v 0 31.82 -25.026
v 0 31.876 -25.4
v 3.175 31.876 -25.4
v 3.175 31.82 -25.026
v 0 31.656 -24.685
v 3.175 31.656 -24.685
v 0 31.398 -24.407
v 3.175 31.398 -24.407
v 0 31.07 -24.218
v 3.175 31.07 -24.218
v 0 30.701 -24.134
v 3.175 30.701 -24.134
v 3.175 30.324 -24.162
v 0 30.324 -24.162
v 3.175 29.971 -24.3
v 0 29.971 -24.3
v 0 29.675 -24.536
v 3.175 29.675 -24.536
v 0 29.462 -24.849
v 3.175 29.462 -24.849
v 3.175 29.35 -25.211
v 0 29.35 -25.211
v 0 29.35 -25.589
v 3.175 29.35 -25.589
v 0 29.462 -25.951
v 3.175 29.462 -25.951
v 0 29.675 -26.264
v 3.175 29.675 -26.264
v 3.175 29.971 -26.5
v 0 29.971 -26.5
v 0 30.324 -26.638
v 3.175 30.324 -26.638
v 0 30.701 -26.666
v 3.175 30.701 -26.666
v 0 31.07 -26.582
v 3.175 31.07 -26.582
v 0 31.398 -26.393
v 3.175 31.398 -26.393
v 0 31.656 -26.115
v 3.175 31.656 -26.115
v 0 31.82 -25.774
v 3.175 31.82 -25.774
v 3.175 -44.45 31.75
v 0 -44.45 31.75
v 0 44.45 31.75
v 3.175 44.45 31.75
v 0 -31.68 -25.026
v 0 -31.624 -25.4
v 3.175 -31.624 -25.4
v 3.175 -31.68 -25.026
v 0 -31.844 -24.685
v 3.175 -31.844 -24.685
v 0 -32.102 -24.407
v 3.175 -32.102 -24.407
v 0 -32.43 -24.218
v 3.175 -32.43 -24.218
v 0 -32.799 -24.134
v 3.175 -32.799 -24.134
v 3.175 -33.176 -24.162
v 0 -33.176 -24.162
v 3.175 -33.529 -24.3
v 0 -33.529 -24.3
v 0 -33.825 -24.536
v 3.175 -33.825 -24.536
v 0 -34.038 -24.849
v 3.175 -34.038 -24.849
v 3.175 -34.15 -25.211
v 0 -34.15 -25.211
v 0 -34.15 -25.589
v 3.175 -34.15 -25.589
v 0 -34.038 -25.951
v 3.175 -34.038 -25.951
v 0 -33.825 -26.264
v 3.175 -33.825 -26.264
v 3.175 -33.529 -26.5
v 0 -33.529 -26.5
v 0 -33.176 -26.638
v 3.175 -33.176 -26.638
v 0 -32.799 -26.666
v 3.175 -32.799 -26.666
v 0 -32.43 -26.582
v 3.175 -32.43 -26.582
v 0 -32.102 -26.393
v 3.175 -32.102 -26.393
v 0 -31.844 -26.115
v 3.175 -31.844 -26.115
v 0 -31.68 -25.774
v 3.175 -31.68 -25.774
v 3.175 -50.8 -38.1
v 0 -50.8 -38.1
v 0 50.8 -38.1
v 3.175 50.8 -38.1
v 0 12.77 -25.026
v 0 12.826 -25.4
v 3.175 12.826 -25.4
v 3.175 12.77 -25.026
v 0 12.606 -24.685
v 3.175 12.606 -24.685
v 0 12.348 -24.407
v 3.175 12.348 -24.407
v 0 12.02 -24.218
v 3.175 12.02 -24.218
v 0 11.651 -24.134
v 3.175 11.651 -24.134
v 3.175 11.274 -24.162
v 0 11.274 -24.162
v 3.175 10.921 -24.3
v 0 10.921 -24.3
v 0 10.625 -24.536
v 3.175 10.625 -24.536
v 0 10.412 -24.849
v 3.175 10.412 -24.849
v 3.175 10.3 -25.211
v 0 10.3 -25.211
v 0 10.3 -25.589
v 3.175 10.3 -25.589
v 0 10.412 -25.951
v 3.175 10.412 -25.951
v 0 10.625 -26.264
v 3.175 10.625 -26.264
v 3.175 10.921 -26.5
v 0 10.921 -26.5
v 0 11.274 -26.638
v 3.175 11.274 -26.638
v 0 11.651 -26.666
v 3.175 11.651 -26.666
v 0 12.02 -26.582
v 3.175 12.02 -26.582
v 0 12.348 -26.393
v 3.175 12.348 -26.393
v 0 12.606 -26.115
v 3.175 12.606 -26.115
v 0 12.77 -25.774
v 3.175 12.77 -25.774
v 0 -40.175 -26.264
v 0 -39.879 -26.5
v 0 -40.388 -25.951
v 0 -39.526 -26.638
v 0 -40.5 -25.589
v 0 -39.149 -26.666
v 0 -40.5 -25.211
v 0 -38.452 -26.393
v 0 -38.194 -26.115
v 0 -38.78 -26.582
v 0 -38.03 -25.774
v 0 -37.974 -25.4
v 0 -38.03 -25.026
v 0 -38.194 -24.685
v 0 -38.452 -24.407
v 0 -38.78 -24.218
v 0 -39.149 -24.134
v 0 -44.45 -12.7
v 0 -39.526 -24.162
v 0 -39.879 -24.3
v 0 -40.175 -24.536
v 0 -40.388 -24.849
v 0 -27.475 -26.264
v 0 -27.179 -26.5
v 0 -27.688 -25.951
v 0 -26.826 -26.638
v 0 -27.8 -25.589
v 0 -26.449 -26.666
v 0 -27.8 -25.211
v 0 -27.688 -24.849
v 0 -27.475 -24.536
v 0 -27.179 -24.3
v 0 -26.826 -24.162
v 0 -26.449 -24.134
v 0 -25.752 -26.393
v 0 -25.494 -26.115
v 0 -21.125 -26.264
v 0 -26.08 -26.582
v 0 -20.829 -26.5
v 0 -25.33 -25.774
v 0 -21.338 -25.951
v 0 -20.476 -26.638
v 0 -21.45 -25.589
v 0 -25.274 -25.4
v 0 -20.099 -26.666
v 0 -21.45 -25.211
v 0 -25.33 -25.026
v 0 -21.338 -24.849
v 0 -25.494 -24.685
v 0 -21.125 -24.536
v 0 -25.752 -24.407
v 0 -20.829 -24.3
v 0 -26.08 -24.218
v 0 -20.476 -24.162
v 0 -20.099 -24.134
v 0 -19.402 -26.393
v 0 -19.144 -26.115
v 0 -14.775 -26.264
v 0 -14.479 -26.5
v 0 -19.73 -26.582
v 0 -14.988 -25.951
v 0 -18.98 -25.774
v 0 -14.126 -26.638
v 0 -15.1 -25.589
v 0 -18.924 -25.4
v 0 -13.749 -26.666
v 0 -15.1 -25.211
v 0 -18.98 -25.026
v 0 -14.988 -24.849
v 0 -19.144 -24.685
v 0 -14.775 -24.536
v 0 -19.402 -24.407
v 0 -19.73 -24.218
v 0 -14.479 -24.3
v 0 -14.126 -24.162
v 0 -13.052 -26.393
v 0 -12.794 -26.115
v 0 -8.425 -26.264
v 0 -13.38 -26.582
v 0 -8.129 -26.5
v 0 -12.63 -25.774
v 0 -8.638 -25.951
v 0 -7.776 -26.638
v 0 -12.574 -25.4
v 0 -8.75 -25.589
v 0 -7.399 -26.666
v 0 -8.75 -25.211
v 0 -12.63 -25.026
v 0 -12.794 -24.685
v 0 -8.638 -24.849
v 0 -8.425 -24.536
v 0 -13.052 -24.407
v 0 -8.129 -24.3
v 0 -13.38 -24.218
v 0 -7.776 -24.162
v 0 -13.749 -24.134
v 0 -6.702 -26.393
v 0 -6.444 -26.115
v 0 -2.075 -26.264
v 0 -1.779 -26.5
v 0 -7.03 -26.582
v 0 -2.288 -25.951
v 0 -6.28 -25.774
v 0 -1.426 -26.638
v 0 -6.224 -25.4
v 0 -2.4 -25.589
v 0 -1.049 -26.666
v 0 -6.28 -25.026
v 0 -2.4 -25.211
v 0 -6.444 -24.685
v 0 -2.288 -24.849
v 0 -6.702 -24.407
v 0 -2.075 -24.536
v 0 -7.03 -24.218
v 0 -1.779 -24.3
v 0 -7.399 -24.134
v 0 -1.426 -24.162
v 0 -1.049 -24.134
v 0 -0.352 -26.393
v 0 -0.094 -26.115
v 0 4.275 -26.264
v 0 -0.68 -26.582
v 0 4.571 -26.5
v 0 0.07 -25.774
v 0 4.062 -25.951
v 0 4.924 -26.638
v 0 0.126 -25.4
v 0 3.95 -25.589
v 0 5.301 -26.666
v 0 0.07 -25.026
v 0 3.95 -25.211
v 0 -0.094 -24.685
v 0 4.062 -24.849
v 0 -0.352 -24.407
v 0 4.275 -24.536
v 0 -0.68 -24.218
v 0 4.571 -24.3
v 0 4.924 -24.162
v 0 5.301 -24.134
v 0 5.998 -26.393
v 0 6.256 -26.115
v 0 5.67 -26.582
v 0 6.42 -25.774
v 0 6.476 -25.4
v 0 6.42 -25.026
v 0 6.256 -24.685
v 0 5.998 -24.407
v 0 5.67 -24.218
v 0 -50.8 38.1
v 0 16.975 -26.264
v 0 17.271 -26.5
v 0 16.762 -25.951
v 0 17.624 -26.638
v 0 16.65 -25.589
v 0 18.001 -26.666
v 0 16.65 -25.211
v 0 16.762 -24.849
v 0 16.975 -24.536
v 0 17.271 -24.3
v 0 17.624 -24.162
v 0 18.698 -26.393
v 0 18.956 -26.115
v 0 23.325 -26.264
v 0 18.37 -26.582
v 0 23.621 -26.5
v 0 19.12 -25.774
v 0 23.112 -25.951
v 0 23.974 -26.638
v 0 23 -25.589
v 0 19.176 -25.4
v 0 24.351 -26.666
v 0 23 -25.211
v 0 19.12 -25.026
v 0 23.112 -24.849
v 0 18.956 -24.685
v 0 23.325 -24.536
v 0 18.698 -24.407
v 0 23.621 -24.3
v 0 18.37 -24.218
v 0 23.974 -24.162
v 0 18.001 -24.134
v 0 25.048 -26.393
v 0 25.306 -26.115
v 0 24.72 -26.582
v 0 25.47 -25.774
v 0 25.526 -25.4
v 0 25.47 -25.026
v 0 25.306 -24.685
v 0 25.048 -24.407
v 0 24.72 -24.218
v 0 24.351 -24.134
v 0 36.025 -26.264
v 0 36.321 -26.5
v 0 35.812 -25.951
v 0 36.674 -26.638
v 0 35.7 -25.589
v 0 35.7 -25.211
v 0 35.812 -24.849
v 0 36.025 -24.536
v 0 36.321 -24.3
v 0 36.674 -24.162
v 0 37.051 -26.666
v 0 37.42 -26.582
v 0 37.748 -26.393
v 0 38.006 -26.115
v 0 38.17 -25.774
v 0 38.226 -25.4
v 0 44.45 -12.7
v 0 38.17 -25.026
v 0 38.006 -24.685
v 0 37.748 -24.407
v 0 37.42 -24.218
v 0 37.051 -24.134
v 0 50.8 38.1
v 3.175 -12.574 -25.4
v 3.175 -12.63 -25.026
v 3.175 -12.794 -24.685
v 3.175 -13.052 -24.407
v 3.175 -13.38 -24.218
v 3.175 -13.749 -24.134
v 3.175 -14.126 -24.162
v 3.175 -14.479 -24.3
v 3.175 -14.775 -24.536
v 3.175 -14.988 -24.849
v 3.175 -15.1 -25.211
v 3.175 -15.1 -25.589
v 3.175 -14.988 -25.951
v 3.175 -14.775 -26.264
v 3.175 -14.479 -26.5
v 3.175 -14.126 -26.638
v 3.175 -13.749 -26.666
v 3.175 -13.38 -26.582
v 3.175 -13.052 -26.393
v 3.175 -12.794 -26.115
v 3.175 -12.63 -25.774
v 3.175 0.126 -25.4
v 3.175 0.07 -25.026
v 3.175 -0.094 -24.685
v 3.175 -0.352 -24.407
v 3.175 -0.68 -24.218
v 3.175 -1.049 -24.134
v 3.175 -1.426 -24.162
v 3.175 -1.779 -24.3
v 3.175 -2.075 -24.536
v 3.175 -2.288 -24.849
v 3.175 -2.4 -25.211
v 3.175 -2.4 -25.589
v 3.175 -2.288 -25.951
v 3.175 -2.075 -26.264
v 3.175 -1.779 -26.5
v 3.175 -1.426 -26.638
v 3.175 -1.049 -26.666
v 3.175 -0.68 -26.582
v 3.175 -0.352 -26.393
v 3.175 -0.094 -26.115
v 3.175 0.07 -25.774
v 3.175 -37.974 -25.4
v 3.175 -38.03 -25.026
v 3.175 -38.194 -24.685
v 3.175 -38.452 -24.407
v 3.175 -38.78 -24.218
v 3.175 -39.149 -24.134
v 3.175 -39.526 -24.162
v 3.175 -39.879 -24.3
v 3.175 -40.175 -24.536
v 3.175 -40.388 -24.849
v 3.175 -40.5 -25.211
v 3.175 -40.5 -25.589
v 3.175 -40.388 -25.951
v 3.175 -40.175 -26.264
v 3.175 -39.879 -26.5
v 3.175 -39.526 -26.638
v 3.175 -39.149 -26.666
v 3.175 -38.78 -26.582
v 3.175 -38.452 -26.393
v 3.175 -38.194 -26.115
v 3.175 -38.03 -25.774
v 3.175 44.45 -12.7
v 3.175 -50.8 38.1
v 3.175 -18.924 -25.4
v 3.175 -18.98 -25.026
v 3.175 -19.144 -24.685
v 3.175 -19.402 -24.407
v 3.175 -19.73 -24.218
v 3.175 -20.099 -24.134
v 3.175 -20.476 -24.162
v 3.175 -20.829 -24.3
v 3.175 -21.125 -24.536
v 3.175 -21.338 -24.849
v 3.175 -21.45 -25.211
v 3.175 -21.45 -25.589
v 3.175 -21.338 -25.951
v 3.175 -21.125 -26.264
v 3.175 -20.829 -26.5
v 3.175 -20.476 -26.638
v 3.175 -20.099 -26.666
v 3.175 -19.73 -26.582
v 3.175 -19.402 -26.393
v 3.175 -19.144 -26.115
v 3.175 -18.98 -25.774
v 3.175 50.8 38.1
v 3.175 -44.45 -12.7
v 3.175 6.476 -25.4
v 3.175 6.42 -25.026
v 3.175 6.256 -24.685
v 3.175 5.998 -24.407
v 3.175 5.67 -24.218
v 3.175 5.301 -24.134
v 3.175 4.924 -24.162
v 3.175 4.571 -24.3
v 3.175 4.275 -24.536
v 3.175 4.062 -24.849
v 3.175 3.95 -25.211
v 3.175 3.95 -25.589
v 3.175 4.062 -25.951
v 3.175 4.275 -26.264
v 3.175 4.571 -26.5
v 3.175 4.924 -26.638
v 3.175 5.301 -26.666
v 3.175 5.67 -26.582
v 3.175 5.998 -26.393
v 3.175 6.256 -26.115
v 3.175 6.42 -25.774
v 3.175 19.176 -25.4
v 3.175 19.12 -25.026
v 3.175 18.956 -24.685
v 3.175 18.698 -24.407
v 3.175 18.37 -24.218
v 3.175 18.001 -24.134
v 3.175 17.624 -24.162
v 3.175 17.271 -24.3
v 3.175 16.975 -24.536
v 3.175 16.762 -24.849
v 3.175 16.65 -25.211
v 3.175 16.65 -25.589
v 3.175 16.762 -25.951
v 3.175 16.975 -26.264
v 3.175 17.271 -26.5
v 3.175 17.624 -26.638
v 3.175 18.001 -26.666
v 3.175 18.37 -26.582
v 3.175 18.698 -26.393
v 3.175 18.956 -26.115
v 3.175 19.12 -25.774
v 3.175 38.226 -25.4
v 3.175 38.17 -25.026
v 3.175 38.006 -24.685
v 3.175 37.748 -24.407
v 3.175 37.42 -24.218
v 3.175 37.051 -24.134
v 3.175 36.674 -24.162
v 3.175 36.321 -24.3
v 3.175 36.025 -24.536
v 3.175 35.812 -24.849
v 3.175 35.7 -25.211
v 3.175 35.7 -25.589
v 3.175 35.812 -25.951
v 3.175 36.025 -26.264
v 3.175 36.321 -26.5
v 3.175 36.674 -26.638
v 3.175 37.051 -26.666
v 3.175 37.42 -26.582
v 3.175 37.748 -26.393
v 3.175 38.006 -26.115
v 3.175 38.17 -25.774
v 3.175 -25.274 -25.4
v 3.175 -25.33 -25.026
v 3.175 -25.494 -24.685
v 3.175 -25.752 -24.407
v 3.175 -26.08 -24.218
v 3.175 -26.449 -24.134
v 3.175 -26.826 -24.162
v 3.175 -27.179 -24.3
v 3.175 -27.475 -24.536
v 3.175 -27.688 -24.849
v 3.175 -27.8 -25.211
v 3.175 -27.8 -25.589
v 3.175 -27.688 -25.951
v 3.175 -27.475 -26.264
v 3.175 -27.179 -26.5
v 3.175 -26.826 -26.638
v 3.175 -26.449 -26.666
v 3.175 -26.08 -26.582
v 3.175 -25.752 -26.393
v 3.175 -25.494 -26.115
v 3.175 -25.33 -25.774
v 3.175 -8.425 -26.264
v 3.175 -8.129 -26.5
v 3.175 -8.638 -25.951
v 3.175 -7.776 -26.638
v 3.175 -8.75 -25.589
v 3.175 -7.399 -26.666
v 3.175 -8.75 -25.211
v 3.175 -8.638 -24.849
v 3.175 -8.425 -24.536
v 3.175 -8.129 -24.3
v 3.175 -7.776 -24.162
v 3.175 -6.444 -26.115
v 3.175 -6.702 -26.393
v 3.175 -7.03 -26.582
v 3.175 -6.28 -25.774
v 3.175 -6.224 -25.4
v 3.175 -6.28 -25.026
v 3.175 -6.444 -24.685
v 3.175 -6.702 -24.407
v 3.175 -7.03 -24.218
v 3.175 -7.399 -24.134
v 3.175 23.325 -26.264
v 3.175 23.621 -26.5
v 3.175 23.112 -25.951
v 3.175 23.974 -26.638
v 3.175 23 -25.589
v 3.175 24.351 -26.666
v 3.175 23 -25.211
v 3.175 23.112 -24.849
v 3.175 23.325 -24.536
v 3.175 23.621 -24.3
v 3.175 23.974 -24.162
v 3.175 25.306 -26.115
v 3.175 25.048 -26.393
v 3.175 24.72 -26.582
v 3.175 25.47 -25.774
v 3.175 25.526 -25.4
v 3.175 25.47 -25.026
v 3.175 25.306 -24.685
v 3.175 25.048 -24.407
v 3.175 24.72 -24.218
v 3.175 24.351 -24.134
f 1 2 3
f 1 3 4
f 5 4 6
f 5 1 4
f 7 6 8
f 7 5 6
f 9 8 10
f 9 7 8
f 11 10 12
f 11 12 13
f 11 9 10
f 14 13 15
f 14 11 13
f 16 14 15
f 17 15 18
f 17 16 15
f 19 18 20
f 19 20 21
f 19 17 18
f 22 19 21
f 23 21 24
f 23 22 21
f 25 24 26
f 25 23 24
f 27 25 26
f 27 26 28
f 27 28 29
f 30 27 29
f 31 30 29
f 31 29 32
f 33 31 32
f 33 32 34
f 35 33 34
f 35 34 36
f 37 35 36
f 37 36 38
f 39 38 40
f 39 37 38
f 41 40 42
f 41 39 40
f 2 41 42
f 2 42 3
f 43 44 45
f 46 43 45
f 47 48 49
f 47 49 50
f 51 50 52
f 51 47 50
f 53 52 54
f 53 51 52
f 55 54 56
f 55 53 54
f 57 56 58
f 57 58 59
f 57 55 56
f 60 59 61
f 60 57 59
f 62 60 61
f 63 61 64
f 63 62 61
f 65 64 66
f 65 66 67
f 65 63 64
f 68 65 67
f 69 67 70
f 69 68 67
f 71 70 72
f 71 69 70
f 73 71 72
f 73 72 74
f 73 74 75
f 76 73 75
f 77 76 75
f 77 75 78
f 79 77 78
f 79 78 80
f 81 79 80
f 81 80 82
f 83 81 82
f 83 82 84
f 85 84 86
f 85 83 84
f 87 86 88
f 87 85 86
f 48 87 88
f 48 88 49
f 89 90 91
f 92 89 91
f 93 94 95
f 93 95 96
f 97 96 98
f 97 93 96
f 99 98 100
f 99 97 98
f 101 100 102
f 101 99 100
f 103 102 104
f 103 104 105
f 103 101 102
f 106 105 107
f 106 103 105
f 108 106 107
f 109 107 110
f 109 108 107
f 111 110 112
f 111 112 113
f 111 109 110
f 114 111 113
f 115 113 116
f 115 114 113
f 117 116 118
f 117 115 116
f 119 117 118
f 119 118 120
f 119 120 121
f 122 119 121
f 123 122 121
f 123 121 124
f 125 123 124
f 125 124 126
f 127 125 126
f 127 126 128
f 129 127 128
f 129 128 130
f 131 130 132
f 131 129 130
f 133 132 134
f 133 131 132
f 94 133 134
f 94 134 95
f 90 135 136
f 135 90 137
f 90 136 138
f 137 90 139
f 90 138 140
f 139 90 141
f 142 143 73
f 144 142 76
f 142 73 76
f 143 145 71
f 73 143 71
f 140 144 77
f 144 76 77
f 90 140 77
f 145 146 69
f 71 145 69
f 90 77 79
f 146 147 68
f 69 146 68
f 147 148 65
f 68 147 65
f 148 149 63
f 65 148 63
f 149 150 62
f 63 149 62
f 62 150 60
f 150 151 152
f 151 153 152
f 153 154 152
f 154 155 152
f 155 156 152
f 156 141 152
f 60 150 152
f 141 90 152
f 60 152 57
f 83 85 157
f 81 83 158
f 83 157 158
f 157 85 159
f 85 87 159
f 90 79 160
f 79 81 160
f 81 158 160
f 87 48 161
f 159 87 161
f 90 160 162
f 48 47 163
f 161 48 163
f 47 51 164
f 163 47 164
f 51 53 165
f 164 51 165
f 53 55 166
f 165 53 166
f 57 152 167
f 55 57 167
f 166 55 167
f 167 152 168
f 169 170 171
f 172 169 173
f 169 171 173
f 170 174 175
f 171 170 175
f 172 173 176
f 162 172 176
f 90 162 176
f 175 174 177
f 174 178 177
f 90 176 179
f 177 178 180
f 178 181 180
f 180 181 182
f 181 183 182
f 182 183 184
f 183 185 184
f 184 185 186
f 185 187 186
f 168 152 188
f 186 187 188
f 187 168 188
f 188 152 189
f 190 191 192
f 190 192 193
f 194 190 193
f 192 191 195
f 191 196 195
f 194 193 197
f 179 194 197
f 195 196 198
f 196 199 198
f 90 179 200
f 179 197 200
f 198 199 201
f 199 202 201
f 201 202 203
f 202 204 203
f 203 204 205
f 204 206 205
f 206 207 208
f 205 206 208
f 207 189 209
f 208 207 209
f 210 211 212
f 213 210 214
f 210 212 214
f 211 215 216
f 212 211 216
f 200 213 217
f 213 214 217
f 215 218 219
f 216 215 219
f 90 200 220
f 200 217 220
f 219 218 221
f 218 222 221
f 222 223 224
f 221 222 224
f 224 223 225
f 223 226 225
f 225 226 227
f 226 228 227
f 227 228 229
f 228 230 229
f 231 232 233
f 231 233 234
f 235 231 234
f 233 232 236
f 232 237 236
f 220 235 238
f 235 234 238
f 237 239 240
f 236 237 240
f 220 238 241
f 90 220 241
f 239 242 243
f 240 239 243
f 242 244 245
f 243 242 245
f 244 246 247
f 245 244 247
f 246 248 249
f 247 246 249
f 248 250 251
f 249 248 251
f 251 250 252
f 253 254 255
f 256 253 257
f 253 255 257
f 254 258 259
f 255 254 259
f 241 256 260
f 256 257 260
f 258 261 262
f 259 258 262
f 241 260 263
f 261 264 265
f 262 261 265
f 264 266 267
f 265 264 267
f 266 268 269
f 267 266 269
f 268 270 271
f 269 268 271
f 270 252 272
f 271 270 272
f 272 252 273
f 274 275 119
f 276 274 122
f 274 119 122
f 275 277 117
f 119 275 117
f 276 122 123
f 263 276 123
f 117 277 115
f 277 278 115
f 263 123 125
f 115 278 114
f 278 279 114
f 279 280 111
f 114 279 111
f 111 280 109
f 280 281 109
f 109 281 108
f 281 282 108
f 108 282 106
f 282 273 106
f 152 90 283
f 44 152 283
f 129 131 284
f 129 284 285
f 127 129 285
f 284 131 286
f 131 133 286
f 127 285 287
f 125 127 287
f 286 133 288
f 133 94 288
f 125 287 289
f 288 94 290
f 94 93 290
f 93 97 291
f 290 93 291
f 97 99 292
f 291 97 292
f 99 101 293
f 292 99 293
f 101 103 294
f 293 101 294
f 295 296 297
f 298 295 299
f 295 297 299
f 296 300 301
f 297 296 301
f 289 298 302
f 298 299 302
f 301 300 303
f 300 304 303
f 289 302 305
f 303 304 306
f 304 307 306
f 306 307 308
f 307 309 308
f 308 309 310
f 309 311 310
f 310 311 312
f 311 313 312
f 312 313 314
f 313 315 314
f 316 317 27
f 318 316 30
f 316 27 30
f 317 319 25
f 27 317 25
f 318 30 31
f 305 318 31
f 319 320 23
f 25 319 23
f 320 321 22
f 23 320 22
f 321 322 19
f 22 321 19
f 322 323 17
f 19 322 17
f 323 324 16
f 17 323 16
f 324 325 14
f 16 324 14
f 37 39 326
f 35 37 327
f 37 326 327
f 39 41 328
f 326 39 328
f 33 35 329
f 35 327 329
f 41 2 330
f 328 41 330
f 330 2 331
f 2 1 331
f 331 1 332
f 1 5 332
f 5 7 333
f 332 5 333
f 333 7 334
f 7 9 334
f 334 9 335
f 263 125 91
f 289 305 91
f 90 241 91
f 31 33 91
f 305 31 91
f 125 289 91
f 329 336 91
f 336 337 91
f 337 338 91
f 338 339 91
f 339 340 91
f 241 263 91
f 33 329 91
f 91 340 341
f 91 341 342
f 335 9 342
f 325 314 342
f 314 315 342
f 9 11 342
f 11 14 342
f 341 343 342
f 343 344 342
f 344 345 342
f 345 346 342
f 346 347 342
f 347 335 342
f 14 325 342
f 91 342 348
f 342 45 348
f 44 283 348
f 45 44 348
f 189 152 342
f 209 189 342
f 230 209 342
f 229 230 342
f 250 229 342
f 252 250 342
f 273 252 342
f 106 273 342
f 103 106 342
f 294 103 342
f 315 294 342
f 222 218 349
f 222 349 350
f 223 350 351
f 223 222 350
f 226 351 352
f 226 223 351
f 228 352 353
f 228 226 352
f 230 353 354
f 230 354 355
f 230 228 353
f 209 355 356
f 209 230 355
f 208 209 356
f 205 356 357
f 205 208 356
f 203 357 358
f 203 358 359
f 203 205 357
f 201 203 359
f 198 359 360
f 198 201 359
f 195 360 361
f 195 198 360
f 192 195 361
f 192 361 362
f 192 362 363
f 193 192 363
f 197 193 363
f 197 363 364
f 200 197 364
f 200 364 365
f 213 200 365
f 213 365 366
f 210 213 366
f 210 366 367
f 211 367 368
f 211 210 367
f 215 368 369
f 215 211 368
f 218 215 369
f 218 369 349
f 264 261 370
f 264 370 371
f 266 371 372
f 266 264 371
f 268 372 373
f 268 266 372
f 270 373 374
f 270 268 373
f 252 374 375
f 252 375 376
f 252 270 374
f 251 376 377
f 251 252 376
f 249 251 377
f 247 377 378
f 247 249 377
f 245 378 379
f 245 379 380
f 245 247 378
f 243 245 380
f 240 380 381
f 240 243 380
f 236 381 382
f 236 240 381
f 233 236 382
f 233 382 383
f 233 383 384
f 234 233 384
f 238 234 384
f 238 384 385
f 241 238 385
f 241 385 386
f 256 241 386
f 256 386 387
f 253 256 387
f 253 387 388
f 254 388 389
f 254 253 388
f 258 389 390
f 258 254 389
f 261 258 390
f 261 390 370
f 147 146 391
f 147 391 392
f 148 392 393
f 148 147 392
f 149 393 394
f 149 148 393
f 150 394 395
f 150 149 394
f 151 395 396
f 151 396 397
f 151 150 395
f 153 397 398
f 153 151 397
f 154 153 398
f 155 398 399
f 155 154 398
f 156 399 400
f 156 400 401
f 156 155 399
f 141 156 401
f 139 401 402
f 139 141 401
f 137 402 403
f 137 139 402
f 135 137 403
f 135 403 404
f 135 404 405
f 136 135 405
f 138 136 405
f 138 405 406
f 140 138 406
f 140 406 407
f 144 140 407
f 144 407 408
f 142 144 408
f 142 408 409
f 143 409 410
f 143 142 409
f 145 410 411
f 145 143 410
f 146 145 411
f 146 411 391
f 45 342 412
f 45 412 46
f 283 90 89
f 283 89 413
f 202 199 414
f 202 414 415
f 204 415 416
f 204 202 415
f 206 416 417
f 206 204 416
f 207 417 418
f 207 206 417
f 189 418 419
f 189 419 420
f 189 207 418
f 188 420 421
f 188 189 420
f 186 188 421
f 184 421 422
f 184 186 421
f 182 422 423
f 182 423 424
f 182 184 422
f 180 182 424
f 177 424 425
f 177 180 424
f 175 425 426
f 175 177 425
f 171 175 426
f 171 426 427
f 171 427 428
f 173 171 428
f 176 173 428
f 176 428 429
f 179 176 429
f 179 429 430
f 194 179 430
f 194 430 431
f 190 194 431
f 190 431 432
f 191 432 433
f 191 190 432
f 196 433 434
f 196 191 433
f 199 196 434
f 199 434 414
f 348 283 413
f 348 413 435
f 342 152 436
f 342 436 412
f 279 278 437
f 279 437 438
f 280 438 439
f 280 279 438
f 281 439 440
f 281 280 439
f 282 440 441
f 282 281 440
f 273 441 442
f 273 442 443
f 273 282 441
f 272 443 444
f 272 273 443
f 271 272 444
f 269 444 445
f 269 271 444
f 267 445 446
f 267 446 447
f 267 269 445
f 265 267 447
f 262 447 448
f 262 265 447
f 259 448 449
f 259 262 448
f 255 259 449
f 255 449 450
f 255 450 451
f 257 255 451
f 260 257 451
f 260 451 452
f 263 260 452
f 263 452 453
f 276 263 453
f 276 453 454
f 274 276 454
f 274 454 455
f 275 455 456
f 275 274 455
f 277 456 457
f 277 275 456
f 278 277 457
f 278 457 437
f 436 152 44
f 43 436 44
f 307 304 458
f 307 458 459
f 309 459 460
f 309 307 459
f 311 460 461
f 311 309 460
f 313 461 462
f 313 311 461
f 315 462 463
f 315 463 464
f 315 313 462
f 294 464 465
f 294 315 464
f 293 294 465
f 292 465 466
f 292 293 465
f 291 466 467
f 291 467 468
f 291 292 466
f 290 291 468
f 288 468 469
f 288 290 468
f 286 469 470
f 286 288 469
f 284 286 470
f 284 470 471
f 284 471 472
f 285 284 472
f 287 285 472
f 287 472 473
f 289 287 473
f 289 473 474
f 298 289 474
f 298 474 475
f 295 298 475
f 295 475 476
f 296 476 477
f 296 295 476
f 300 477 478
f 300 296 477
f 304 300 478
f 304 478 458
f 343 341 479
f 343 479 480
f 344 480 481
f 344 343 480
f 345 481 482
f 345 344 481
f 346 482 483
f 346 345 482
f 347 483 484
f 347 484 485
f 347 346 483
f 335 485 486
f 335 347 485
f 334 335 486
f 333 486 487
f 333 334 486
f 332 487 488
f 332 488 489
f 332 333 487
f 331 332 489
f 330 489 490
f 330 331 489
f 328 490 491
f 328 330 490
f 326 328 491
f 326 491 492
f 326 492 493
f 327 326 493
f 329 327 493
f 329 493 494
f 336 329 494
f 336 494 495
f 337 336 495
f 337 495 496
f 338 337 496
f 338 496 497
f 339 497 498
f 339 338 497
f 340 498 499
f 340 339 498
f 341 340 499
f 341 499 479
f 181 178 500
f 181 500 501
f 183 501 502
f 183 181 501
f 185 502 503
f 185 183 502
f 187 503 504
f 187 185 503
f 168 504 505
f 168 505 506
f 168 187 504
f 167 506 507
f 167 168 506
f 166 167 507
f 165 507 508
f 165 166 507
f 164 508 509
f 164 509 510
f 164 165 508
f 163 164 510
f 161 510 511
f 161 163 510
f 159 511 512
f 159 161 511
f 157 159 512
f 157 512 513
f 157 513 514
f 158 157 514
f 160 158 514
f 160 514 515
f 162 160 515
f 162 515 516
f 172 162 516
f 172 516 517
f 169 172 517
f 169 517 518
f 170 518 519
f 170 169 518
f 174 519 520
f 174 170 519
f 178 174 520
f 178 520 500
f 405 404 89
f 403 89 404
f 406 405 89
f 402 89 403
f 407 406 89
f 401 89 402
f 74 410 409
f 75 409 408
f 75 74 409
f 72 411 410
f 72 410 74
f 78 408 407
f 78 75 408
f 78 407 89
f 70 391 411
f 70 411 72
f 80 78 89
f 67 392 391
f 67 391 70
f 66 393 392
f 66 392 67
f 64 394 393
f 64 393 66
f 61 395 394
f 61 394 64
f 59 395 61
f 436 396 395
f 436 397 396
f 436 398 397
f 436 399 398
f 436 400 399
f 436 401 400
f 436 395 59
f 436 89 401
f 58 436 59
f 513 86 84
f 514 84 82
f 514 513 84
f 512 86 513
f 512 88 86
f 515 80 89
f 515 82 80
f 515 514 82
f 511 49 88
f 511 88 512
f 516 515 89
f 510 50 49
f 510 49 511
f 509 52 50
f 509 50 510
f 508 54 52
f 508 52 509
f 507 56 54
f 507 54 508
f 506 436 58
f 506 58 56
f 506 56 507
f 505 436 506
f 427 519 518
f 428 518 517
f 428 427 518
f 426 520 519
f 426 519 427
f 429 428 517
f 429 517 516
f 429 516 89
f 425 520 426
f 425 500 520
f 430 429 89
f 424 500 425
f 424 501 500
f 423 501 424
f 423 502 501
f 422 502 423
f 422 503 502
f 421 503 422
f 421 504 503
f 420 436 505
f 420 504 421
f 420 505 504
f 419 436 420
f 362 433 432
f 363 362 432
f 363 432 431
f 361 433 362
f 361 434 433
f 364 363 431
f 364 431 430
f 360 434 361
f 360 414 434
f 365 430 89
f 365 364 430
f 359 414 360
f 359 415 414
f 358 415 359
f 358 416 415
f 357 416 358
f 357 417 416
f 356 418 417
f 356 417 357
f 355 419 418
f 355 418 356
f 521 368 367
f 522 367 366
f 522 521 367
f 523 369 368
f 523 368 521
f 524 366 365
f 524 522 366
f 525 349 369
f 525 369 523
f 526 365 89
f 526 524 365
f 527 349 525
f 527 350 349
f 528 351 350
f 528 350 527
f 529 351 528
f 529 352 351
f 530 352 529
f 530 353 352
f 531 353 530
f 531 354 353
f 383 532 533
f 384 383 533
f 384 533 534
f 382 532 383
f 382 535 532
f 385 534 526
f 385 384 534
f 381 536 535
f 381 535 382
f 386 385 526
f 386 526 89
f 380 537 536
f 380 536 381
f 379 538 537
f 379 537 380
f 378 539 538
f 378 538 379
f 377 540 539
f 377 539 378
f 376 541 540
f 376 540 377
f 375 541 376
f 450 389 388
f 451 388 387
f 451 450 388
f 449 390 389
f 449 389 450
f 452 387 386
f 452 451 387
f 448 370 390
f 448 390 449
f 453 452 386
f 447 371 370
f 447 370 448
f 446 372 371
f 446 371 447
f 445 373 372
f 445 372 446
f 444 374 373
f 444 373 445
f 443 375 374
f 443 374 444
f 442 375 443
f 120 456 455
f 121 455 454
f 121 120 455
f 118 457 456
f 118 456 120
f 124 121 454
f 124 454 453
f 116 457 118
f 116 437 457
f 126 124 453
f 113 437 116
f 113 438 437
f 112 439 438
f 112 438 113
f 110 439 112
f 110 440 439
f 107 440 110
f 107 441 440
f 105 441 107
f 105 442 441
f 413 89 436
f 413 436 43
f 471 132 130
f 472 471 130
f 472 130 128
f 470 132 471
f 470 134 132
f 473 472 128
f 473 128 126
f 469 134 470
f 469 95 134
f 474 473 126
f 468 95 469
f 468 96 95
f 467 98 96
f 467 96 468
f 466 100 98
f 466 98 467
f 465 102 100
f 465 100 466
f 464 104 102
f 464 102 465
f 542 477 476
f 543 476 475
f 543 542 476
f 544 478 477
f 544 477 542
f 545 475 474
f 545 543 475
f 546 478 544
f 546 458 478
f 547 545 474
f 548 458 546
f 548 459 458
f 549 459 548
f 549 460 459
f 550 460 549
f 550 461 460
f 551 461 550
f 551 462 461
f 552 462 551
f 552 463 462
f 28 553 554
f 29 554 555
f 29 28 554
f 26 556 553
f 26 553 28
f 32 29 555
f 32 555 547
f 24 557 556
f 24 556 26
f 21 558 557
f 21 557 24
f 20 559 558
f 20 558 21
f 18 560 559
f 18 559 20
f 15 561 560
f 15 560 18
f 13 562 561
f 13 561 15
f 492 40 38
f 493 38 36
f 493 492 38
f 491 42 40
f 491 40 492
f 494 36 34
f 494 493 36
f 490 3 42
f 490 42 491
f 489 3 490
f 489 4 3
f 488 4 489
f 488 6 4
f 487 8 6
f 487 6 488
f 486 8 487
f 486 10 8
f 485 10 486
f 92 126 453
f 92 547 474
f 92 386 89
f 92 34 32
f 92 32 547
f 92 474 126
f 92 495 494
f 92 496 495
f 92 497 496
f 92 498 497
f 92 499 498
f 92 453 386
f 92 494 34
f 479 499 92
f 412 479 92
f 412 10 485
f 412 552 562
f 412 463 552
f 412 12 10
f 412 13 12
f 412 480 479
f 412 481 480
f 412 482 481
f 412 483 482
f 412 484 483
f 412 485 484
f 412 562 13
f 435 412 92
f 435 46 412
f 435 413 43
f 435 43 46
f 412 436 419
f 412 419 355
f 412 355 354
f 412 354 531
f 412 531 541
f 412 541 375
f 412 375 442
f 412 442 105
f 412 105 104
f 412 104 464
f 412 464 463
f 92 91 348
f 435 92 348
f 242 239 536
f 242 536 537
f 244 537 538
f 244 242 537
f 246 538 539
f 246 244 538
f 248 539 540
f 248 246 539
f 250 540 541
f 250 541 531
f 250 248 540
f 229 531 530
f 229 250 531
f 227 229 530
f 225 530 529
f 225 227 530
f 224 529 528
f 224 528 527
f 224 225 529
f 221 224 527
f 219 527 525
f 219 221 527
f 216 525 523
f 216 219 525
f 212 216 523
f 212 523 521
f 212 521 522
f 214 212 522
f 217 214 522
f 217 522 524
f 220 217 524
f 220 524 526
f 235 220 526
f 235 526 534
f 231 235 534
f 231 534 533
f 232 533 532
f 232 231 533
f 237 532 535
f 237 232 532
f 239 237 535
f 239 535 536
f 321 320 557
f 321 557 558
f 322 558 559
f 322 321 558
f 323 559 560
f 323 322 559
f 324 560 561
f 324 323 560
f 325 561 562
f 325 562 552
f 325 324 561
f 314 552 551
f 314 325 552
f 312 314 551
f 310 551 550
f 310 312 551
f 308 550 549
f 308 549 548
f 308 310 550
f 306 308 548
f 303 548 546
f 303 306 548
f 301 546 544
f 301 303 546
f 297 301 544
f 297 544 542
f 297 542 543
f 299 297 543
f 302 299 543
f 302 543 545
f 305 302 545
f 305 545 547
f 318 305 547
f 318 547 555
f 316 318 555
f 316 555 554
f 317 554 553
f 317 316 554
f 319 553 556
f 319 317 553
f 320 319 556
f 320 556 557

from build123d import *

# Parameters (mm, degrees)
F0_W     = 101.6
F0_H     = 76.2
F0_R     = 1.27
F0_W_2   = 88.9
F0_H_2   = 44.45
F1_DEPTH = 3.175


with BuildPart() as f1:
    # F0 (on Right) → F1 (new body)
    with BuildSketch(Plane.YZ):
        Rectangle(F0_W, F0_H)
        with Locations((-39.243757, -25.4)):
            Circle(F0_R, mode=Mode.SUBTRACT)
        with Locations((-32.893757, -25.4)):
            Circle(F0_R, mode=Mode.SUBTRACT)
        with Locations((-26.543757, -25.4)):
            Circle(F0_R, mode=Mode.SUBTRACT)
        with Locations((-20.193757, -25.4)):
            Circle(F0_R, mode=Mode.SUBTRACT)
        with Locations((-13.843757, -25.4)):
            Circle(F0_R, mode=Mode.SUBTRACT)
        with Locations((-7.493757, -25.4)):
            Circle(F0_R, mode=Mode.SUBTRACT)
        with Locations((-1.143757, -25.4)):
            Circle(F0_R, mode=Mode.SUBTRACT)
        with Locations((5.206243, -25.4)):
            Circle(F0_R, mode=Mode.SUBTRACT)
        with Locations((11.556243, -25.4)):
            Circle(F0_R, mode=Mode.SUBTRACT)
        with Locations((17.906243, -25.4)):
            Circle(F0_R, mode=Mode.SUBTRACT)
        with Locations((24.256243, -25.4)):
            Circle(F0_R, mode=Mode.SUBTRACT)
        with Locations((30.606243, -25.4)):
            Circle(F0_R, mode=Mode.SUBTRACT)
        with Locations((36.956243, -25.4)):
            Circle(F0_R, mode=Mode.SUBTRACT)
        with Locations((0, 9.525)):
            Rectangle(F0_W_2, F0_H_2, mode=Mode.SUBTRACT)
    extrude(amount=F1_DEPTH)


solid = f1.part
